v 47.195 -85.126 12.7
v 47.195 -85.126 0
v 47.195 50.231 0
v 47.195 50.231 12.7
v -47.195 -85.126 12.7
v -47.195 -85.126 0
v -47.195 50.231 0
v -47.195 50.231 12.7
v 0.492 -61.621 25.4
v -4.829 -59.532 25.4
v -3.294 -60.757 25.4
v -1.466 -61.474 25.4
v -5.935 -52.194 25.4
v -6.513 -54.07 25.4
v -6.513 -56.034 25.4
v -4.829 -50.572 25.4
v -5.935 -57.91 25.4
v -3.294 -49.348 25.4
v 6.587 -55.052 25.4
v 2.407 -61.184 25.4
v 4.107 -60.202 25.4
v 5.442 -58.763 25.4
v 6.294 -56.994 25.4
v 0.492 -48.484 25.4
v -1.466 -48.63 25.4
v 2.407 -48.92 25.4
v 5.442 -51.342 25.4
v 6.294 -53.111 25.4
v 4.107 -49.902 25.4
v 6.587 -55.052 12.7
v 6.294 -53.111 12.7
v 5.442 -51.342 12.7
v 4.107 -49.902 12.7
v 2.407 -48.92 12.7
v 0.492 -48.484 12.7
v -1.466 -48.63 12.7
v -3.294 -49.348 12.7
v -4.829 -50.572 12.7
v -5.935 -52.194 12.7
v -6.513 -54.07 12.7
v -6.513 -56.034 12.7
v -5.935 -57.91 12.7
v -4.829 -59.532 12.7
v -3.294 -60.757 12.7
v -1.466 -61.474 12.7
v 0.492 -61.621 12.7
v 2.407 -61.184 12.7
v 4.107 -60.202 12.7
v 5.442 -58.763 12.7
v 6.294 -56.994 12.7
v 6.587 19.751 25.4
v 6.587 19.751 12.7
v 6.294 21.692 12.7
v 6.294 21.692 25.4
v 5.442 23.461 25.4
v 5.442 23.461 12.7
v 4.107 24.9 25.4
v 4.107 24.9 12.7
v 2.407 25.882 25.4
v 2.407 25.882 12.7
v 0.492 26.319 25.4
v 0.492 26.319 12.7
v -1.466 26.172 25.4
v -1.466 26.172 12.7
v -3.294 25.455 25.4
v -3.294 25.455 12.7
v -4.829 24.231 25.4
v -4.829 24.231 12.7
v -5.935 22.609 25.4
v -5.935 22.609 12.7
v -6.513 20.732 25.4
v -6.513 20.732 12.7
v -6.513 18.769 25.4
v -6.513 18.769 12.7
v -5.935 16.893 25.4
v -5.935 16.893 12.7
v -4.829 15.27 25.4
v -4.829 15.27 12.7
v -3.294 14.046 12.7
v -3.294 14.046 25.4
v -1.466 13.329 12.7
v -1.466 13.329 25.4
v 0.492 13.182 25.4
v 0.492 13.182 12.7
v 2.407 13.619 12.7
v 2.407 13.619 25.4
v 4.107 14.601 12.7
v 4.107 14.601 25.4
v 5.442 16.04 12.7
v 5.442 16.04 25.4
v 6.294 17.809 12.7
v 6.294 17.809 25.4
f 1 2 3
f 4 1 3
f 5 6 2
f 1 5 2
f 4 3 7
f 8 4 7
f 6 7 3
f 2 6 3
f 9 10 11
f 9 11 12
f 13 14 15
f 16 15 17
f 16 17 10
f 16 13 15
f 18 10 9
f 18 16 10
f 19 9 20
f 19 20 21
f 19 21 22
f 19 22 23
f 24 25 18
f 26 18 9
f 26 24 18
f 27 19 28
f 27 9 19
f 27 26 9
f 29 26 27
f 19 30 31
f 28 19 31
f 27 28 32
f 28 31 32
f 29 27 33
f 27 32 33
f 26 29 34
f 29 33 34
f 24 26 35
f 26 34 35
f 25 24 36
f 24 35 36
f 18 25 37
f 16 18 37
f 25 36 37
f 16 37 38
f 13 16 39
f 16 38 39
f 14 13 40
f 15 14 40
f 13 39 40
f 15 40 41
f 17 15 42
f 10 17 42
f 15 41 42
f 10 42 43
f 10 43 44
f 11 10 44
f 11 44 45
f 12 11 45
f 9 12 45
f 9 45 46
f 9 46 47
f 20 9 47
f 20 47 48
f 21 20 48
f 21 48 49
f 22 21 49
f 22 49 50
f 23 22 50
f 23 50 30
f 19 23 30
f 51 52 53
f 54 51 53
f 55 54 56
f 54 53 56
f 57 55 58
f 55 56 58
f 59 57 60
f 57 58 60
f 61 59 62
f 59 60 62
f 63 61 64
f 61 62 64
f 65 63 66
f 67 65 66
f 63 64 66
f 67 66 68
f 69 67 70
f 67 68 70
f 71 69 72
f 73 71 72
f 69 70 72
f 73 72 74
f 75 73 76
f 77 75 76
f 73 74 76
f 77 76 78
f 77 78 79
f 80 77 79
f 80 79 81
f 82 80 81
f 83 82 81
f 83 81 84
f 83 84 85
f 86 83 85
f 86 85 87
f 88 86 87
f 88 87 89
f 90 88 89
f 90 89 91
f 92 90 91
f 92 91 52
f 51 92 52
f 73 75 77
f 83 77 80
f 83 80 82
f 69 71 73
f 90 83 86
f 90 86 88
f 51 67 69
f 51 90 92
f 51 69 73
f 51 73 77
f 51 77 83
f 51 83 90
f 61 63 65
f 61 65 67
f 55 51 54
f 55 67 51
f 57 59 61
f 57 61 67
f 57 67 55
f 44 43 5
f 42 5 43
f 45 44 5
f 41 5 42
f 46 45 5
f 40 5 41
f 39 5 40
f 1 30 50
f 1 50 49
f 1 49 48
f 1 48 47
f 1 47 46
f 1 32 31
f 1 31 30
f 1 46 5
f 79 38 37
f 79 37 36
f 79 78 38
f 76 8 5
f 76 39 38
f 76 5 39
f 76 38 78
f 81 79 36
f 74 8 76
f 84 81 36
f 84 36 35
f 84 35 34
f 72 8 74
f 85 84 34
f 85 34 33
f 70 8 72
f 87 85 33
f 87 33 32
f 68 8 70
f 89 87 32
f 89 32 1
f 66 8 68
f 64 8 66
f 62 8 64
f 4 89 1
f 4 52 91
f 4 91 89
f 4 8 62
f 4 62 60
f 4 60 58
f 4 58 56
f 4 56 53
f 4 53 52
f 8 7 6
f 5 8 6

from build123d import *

# Parameters (mm, degrees)
F0_R     = 6.587006
F1_DEPTH = 12.7
F2_DEPTH = 25.4


with BuildPart() as f1:
    # F0 (on Top) → F1 (new body)
    with BuildSketch(Plane.XY):
        Polygon((0, 50.230512), (-47.195485, 50.230512), (-47.195485, 19.750512), (-47.195485, -54.646088), (-47.195485, -85.126088), (0, -85.126088), (47.195485, -85.126088), (47.195485, -54.646088), (47.195485, 19.750512), (47.195485, 50.230512), align=None)
        with Locations((0, -55.052097)):
            Circle(F0_R, mode=Mode.SUBTRACT)
        with Locations((0, 19.750512)):
            Circle(F0_R, mode=Mode.SUBTRACT)
        with Locations((0, 19.750512)):
            Circle(F0_R)
        with Locations((0, -55.052097)):
            Circle(F0_R)
    extrude(amount=F1_DEPTH)

    # F0 (on Top) → F2 (join)
    with BuildSketch(Plane.XY):
        with Locations((0, 19.750512)):
            Circle(F0_R)
        with Locations((0, -55.052097)):
            Circle(F0_R)
    extrude(amount=F2_DEPTH)


solid = f1.part
